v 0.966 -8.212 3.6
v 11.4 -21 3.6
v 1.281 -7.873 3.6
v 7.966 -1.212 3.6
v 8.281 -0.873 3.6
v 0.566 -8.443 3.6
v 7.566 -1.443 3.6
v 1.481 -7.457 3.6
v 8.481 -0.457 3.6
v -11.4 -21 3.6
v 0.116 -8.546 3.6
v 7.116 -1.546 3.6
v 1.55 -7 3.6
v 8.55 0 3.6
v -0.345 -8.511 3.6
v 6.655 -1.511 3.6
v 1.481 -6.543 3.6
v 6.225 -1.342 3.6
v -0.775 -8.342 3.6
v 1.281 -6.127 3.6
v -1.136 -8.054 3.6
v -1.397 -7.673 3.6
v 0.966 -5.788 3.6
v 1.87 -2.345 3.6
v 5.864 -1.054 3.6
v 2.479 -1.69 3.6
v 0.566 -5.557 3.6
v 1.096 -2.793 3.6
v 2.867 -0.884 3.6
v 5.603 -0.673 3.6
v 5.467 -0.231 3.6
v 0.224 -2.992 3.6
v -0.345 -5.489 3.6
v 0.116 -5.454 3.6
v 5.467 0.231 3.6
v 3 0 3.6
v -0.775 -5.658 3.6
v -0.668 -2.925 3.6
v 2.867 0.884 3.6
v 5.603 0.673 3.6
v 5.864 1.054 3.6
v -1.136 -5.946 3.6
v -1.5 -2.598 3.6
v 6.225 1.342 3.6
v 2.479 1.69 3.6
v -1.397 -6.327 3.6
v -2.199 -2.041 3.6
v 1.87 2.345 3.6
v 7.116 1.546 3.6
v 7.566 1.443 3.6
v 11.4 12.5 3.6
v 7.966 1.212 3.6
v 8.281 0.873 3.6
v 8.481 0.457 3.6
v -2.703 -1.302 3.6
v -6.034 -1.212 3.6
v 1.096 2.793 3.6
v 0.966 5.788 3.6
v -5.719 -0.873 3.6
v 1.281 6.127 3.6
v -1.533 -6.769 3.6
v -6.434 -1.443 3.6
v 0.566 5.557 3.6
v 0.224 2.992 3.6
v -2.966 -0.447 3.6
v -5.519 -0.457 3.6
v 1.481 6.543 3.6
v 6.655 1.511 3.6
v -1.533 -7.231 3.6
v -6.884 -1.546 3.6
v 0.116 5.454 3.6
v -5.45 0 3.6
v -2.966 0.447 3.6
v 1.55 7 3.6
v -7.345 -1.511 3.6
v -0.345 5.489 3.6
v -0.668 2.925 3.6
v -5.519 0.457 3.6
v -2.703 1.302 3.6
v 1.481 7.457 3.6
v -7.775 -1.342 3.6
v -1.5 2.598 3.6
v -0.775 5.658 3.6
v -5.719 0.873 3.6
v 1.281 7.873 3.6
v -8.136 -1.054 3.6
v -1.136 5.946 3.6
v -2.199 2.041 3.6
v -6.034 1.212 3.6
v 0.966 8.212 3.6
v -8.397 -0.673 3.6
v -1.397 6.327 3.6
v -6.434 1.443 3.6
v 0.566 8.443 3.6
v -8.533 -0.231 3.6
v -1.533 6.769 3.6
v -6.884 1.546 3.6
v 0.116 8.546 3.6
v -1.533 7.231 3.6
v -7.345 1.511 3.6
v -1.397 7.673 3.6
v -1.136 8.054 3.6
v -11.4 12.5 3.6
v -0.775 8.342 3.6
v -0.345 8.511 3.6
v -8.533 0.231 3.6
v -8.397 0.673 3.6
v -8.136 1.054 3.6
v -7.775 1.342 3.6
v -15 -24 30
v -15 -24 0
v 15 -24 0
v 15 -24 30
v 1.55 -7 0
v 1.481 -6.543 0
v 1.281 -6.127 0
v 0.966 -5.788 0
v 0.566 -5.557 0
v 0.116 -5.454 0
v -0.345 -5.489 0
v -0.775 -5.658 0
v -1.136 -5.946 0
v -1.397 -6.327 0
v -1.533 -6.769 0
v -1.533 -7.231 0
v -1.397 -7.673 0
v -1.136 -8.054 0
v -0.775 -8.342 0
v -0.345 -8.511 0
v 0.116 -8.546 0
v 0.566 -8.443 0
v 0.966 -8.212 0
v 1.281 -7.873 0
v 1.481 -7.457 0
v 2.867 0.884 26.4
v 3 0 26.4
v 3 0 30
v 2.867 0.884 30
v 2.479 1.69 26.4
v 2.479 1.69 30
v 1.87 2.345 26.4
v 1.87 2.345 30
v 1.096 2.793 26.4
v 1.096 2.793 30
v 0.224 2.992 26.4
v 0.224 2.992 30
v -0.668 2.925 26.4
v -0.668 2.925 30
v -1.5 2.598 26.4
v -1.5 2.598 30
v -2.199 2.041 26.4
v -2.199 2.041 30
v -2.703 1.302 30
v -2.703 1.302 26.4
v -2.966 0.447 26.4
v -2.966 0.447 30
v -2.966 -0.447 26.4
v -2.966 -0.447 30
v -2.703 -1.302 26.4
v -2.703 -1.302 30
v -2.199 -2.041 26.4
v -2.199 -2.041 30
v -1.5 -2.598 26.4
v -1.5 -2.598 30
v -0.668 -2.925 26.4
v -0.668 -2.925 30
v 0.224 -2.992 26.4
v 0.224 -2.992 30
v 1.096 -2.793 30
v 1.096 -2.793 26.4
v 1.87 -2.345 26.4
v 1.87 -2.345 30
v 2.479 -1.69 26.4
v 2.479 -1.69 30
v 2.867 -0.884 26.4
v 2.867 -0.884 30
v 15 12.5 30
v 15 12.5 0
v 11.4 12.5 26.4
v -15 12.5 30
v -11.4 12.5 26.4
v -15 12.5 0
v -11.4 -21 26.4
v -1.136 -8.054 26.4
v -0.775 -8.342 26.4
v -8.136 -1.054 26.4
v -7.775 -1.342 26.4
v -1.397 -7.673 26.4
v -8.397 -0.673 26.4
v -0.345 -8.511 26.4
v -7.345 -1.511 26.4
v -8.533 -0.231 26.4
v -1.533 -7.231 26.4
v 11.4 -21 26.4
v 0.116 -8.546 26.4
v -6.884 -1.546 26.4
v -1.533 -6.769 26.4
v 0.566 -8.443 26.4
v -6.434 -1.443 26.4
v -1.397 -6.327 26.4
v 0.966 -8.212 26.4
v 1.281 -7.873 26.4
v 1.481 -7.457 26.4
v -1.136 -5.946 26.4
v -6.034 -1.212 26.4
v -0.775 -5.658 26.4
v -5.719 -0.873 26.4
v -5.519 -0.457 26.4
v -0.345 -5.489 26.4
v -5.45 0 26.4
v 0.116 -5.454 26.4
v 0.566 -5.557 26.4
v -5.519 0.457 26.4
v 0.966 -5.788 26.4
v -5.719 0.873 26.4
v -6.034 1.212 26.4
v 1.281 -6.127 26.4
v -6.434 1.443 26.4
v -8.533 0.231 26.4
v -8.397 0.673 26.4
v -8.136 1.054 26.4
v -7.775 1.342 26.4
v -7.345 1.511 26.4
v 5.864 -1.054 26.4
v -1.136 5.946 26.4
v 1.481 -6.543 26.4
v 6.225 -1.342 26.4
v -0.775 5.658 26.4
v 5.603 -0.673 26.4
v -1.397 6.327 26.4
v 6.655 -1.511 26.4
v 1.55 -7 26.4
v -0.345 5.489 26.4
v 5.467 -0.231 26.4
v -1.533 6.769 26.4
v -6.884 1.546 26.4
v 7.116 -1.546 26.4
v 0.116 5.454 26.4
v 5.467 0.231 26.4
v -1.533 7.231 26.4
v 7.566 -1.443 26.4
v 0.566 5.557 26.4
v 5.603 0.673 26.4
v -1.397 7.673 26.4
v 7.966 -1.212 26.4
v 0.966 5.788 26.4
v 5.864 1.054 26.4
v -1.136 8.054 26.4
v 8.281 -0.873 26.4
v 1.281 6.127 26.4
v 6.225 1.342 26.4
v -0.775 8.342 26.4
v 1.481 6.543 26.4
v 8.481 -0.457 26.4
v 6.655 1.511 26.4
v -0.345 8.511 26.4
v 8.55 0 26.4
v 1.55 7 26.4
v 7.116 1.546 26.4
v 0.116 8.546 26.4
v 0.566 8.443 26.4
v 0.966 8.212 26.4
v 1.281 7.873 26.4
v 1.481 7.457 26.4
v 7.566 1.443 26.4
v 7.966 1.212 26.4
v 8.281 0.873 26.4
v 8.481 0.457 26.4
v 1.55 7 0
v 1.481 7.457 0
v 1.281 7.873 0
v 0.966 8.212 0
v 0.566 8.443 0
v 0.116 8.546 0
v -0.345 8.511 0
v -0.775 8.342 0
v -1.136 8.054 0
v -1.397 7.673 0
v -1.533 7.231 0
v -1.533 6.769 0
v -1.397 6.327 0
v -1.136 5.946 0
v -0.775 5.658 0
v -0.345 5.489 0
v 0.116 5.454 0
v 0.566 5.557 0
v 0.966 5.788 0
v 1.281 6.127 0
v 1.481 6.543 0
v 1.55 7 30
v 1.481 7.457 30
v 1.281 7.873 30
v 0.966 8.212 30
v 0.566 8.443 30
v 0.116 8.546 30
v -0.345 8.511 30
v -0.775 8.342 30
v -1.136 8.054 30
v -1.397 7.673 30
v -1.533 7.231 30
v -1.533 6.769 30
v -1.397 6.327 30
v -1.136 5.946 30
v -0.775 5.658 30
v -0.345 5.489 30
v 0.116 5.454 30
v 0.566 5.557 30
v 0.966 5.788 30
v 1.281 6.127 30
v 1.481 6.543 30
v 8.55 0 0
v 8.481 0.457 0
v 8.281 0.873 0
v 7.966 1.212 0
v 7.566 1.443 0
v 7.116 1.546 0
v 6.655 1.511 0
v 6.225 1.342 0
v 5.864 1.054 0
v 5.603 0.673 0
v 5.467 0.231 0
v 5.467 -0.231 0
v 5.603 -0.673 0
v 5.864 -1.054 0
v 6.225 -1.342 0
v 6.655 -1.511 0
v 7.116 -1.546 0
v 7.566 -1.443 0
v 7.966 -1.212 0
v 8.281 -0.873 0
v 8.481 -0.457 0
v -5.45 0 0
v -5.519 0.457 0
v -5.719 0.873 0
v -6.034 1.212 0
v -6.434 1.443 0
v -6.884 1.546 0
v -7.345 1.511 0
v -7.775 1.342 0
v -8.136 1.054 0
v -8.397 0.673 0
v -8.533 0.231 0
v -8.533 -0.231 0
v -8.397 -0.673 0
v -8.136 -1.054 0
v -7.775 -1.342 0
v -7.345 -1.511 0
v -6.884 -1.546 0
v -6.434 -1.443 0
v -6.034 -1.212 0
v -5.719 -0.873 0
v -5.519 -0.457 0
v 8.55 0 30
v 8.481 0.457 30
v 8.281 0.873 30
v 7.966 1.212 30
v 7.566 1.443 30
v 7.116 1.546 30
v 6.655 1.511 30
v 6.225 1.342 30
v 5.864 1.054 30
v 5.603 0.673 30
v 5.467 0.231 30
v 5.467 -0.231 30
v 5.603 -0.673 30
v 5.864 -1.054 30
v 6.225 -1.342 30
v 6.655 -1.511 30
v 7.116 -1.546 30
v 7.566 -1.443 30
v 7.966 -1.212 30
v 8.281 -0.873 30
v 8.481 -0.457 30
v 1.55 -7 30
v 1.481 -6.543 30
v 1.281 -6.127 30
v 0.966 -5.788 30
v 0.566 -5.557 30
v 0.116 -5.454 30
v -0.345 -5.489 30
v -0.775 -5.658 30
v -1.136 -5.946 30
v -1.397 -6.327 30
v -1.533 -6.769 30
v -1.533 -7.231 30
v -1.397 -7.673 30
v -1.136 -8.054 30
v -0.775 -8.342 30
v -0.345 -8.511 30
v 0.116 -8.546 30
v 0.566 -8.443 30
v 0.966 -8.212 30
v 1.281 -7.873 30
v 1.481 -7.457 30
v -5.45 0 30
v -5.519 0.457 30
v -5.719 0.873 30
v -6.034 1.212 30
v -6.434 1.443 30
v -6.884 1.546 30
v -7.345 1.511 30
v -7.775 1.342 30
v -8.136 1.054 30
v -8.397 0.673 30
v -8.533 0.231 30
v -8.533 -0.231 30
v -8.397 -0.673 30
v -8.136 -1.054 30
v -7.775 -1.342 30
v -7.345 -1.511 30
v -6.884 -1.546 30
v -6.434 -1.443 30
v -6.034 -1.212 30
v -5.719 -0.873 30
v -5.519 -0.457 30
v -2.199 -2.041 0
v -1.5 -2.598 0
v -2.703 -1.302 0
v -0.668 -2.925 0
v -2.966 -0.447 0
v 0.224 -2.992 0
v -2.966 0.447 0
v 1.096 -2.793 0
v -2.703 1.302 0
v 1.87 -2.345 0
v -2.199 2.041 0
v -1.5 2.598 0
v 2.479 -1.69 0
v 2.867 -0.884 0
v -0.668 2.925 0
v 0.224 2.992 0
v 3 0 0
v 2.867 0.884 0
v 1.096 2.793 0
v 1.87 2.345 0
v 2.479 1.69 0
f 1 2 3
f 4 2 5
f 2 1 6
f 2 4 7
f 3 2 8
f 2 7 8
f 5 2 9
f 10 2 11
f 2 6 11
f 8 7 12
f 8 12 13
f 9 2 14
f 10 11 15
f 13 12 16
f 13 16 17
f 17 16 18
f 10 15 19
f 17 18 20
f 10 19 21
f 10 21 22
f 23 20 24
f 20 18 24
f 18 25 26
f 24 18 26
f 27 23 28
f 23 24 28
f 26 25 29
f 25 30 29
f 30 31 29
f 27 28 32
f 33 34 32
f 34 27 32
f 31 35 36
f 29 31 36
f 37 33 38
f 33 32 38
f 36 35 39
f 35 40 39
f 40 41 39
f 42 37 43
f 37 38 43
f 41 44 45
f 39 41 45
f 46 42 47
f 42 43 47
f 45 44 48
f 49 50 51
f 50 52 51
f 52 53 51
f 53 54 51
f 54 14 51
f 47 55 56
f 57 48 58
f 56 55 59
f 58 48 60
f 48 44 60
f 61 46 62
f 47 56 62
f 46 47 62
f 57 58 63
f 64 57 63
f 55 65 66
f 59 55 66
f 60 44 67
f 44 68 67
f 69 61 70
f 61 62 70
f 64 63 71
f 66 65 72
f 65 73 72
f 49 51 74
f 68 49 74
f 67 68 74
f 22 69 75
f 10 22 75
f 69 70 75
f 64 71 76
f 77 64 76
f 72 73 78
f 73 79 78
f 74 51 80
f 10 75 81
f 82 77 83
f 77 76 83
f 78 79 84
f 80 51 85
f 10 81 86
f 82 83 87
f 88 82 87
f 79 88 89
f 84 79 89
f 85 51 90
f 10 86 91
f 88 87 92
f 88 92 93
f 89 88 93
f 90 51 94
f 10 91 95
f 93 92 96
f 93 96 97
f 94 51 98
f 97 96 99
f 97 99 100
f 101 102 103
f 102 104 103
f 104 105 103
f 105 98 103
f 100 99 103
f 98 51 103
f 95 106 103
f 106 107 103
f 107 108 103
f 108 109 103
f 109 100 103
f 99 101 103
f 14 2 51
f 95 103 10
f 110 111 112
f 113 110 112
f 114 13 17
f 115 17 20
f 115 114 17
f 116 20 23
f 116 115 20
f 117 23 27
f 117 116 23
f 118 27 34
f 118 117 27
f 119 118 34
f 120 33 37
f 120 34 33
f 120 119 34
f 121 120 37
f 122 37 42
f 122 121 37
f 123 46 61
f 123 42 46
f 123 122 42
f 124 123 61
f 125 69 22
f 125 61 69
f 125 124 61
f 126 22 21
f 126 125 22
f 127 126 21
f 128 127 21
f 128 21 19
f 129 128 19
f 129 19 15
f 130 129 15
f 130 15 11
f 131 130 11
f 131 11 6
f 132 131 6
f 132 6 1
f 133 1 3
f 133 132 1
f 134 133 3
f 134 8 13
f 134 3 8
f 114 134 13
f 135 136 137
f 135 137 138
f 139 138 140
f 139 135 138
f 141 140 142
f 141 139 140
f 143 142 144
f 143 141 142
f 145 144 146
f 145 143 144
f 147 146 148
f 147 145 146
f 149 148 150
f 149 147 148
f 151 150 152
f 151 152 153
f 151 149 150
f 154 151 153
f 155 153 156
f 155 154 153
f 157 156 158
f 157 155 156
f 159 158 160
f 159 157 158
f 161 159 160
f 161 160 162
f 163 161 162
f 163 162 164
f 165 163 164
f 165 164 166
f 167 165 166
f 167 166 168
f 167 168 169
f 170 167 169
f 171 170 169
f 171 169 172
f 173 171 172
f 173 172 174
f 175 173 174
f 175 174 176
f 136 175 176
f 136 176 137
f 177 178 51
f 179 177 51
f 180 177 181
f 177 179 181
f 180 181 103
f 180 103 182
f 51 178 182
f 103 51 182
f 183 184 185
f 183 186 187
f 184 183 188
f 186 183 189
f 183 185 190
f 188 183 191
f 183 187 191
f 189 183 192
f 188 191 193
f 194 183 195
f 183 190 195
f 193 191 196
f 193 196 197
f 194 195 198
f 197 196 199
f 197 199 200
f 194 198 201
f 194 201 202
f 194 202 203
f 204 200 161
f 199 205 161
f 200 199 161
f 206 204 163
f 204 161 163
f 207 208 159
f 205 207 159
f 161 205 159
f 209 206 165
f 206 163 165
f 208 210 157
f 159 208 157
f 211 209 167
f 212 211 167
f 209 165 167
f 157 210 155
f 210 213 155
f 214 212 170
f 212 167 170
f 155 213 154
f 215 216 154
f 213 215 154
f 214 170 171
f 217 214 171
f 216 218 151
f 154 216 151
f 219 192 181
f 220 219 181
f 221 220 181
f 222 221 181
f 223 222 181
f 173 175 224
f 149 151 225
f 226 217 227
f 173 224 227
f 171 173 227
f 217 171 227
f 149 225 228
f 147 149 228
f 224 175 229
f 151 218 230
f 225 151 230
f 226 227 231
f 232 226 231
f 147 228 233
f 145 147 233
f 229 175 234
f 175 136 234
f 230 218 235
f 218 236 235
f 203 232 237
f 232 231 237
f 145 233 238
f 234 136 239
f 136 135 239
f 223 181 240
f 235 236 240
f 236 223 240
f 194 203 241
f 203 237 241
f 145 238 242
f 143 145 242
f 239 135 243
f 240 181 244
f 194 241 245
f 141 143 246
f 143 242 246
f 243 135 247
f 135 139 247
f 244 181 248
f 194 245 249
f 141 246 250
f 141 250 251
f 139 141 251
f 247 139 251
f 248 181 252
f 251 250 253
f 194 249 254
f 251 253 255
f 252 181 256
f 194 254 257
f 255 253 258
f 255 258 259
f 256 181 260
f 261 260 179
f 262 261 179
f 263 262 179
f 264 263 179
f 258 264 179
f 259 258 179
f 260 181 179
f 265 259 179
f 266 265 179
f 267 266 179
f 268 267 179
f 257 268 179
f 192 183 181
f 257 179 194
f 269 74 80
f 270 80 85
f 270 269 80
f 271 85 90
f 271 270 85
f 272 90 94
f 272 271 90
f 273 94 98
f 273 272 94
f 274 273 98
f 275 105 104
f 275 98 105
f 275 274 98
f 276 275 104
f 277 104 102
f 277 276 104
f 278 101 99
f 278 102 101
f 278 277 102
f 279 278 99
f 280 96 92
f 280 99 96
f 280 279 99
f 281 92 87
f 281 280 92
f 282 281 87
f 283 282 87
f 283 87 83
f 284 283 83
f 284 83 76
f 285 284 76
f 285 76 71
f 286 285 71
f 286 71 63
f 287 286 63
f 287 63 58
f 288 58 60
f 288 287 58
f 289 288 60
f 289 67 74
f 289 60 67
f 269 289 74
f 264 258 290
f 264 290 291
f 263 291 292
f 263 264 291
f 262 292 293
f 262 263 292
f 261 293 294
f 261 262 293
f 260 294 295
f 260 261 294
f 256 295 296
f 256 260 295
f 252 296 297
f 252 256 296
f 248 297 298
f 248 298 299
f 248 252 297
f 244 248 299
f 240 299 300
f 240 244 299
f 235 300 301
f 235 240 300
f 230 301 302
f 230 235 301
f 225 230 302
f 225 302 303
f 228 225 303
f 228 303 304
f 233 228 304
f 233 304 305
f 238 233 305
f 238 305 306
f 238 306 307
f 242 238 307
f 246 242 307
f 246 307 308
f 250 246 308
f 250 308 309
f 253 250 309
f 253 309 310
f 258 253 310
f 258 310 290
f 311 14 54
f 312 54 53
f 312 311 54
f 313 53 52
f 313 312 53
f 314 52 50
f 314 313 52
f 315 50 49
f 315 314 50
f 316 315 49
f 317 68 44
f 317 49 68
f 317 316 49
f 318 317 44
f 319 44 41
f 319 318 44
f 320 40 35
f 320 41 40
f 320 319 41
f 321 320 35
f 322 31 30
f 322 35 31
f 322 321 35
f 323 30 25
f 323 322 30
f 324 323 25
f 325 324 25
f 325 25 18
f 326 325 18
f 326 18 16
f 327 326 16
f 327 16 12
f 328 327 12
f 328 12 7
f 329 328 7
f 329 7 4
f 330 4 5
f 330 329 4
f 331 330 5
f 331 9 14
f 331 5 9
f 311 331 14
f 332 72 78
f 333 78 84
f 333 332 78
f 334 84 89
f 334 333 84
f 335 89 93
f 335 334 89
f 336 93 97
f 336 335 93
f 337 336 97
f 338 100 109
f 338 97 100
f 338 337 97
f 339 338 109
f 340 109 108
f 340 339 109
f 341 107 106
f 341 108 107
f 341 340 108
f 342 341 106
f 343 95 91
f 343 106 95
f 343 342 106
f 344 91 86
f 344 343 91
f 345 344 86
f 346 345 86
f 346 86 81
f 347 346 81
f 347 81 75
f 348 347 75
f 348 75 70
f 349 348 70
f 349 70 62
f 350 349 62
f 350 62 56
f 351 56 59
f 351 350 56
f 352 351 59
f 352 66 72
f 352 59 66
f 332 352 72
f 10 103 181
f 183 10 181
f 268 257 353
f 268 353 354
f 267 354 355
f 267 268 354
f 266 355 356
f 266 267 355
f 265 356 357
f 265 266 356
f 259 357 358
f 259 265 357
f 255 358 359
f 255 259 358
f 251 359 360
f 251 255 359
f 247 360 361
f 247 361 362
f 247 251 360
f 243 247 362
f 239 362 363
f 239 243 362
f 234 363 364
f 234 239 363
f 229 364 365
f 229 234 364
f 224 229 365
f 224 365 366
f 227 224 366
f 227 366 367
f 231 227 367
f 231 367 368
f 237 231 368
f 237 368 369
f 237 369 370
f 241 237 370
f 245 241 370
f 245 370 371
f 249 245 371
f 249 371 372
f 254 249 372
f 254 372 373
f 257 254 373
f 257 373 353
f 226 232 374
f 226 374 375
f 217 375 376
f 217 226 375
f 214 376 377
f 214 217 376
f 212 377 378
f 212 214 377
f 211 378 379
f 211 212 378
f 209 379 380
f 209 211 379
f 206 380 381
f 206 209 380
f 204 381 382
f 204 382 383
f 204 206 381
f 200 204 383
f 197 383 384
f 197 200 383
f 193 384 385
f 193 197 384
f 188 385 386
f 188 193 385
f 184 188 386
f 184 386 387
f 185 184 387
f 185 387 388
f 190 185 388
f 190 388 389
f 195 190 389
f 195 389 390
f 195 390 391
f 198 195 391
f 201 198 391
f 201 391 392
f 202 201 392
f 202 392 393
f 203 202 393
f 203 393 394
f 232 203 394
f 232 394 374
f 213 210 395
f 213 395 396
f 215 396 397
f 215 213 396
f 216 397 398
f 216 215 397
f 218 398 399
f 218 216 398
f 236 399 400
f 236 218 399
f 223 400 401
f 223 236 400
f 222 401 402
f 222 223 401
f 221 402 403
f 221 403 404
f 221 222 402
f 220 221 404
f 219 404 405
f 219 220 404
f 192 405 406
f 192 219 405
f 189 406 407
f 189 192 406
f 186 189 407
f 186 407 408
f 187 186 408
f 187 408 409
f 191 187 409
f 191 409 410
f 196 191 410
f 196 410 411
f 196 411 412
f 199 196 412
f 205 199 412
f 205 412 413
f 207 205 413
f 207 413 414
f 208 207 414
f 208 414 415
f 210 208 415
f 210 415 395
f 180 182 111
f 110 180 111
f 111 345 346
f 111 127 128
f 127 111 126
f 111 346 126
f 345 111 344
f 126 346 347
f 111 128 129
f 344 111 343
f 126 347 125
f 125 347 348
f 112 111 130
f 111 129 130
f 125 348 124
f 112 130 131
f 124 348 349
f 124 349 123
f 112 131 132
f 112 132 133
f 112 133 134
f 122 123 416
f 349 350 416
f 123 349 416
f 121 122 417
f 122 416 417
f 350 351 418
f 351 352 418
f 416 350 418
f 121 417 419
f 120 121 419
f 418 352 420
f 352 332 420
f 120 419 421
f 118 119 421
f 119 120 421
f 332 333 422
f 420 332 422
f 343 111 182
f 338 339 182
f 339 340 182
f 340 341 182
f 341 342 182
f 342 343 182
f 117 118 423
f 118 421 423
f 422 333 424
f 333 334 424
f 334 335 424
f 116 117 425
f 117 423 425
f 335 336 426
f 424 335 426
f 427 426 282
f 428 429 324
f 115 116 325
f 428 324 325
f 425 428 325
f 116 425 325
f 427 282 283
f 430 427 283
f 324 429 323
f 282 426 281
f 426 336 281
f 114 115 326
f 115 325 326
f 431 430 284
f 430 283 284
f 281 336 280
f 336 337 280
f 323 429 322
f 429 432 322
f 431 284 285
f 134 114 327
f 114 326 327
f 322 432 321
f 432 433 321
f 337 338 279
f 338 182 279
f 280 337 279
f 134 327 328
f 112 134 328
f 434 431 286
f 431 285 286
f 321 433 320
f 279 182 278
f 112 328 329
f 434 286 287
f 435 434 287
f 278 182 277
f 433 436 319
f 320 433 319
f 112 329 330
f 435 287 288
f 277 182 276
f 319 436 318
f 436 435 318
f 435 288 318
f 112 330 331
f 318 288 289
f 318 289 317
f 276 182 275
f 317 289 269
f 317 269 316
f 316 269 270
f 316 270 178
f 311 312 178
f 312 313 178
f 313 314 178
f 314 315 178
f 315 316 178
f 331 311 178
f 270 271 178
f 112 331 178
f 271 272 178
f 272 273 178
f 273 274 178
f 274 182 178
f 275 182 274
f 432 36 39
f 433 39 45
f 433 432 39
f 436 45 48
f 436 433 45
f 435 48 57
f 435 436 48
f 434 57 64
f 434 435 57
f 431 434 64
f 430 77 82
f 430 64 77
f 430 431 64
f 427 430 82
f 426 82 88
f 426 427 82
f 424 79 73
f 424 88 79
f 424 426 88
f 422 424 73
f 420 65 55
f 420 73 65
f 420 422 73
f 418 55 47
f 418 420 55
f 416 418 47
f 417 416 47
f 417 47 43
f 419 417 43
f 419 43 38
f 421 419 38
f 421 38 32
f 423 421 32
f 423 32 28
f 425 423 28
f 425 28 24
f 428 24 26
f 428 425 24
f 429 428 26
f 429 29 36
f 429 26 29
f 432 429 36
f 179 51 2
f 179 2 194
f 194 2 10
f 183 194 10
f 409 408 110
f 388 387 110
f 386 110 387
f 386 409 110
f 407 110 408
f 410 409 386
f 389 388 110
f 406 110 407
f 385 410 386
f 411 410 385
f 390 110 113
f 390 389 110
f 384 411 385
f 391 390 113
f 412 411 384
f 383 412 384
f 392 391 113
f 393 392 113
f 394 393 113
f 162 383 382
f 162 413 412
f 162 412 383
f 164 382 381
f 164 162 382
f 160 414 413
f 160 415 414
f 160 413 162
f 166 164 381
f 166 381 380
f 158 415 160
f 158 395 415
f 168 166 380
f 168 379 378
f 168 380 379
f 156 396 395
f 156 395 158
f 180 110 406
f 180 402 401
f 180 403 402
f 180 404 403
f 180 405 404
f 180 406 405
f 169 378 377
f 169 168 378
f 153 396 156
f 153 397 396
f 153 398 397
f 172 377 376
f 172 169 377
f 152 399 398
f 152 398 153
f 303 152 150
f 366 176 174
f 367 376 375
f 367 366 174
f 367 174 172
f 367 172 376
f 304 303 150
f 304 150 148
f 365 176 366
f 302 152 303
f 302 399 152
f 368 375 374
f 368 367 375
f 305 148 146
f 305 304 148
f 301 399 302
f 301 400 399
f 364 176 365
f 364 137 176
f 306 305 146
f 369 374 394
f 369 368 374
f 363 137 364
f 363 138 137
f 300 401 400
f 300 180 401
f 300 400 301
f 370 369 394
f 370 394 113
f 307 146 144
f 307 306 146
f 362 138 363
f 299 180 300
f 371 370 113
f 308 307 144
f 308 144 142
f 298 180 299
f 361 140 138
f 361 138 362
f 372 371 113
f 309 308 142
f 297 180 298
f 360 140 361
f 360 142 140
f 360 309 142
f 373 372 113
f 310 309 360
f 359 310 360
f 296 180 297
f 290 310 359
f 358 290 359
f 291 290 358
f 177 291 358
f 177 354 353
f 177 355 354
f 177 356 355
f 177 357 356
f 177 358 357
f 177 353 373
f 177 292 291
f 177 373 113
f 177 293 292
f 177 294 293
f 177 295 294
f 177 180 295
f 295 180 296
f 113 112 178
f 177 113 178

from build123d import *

# Parameters (mm, degrees)
SKETCH_1_R          = 3
SKETCH_1_R_2        = 1.55
EXTRUDE_1_DEPTH     = 30
CUT_EXTRUDE_1_DEPTH = 33.5


with BuildPart() as part:
    # 草图1 → 凸台-拉伸1 (new body)
    with BuildSketch(Plane.XY):
        Polygon((15, 0), (15, 12.5), (0, 12.5), (-15, 12.5), (-15, -24), (15, -24), align=None)
        Circle(SKETCH_1_R, mode=Mode.SUBTRACT)
        with Locations((0, 7)):
            Circle(SKETCH_1_R_2, mode=Mode.SUBTRACT)
        with Locations((7, 0)):
            Circle(SKETCH_1_R_2, mode=Mode.SUBTRACT)
        with Locations((0, -7)):
            Circle(SKETCH_1_R_2, mode=Mode.SUBTRACT)
        with Locations((-7, 0)):
            Circle(SKETCH_1_R_2, mode=Mode.SUBTRACT)
    extrude(amount=EXTRUDE_1_DEPTH)

    # 草图2 → 切除-拉伸1 (cut)
    with BuildSketch(Plane(origin=(0, 12.5, 0), x_dir=(1, 0, 0), z_dir=(0, 1, 0))):
        Polygon((-11.4, -15), (-11.4, -3.6), (0, -3.6), (11.4, -3.6), (11.4, -26.4), (0, -26.4), (-11.4, -26.4), align=None)
    extrude(amount=-CUT_EXTRUDE_1_DEPTH, mode=Mode.SUBTRACT)


solid = part.part
